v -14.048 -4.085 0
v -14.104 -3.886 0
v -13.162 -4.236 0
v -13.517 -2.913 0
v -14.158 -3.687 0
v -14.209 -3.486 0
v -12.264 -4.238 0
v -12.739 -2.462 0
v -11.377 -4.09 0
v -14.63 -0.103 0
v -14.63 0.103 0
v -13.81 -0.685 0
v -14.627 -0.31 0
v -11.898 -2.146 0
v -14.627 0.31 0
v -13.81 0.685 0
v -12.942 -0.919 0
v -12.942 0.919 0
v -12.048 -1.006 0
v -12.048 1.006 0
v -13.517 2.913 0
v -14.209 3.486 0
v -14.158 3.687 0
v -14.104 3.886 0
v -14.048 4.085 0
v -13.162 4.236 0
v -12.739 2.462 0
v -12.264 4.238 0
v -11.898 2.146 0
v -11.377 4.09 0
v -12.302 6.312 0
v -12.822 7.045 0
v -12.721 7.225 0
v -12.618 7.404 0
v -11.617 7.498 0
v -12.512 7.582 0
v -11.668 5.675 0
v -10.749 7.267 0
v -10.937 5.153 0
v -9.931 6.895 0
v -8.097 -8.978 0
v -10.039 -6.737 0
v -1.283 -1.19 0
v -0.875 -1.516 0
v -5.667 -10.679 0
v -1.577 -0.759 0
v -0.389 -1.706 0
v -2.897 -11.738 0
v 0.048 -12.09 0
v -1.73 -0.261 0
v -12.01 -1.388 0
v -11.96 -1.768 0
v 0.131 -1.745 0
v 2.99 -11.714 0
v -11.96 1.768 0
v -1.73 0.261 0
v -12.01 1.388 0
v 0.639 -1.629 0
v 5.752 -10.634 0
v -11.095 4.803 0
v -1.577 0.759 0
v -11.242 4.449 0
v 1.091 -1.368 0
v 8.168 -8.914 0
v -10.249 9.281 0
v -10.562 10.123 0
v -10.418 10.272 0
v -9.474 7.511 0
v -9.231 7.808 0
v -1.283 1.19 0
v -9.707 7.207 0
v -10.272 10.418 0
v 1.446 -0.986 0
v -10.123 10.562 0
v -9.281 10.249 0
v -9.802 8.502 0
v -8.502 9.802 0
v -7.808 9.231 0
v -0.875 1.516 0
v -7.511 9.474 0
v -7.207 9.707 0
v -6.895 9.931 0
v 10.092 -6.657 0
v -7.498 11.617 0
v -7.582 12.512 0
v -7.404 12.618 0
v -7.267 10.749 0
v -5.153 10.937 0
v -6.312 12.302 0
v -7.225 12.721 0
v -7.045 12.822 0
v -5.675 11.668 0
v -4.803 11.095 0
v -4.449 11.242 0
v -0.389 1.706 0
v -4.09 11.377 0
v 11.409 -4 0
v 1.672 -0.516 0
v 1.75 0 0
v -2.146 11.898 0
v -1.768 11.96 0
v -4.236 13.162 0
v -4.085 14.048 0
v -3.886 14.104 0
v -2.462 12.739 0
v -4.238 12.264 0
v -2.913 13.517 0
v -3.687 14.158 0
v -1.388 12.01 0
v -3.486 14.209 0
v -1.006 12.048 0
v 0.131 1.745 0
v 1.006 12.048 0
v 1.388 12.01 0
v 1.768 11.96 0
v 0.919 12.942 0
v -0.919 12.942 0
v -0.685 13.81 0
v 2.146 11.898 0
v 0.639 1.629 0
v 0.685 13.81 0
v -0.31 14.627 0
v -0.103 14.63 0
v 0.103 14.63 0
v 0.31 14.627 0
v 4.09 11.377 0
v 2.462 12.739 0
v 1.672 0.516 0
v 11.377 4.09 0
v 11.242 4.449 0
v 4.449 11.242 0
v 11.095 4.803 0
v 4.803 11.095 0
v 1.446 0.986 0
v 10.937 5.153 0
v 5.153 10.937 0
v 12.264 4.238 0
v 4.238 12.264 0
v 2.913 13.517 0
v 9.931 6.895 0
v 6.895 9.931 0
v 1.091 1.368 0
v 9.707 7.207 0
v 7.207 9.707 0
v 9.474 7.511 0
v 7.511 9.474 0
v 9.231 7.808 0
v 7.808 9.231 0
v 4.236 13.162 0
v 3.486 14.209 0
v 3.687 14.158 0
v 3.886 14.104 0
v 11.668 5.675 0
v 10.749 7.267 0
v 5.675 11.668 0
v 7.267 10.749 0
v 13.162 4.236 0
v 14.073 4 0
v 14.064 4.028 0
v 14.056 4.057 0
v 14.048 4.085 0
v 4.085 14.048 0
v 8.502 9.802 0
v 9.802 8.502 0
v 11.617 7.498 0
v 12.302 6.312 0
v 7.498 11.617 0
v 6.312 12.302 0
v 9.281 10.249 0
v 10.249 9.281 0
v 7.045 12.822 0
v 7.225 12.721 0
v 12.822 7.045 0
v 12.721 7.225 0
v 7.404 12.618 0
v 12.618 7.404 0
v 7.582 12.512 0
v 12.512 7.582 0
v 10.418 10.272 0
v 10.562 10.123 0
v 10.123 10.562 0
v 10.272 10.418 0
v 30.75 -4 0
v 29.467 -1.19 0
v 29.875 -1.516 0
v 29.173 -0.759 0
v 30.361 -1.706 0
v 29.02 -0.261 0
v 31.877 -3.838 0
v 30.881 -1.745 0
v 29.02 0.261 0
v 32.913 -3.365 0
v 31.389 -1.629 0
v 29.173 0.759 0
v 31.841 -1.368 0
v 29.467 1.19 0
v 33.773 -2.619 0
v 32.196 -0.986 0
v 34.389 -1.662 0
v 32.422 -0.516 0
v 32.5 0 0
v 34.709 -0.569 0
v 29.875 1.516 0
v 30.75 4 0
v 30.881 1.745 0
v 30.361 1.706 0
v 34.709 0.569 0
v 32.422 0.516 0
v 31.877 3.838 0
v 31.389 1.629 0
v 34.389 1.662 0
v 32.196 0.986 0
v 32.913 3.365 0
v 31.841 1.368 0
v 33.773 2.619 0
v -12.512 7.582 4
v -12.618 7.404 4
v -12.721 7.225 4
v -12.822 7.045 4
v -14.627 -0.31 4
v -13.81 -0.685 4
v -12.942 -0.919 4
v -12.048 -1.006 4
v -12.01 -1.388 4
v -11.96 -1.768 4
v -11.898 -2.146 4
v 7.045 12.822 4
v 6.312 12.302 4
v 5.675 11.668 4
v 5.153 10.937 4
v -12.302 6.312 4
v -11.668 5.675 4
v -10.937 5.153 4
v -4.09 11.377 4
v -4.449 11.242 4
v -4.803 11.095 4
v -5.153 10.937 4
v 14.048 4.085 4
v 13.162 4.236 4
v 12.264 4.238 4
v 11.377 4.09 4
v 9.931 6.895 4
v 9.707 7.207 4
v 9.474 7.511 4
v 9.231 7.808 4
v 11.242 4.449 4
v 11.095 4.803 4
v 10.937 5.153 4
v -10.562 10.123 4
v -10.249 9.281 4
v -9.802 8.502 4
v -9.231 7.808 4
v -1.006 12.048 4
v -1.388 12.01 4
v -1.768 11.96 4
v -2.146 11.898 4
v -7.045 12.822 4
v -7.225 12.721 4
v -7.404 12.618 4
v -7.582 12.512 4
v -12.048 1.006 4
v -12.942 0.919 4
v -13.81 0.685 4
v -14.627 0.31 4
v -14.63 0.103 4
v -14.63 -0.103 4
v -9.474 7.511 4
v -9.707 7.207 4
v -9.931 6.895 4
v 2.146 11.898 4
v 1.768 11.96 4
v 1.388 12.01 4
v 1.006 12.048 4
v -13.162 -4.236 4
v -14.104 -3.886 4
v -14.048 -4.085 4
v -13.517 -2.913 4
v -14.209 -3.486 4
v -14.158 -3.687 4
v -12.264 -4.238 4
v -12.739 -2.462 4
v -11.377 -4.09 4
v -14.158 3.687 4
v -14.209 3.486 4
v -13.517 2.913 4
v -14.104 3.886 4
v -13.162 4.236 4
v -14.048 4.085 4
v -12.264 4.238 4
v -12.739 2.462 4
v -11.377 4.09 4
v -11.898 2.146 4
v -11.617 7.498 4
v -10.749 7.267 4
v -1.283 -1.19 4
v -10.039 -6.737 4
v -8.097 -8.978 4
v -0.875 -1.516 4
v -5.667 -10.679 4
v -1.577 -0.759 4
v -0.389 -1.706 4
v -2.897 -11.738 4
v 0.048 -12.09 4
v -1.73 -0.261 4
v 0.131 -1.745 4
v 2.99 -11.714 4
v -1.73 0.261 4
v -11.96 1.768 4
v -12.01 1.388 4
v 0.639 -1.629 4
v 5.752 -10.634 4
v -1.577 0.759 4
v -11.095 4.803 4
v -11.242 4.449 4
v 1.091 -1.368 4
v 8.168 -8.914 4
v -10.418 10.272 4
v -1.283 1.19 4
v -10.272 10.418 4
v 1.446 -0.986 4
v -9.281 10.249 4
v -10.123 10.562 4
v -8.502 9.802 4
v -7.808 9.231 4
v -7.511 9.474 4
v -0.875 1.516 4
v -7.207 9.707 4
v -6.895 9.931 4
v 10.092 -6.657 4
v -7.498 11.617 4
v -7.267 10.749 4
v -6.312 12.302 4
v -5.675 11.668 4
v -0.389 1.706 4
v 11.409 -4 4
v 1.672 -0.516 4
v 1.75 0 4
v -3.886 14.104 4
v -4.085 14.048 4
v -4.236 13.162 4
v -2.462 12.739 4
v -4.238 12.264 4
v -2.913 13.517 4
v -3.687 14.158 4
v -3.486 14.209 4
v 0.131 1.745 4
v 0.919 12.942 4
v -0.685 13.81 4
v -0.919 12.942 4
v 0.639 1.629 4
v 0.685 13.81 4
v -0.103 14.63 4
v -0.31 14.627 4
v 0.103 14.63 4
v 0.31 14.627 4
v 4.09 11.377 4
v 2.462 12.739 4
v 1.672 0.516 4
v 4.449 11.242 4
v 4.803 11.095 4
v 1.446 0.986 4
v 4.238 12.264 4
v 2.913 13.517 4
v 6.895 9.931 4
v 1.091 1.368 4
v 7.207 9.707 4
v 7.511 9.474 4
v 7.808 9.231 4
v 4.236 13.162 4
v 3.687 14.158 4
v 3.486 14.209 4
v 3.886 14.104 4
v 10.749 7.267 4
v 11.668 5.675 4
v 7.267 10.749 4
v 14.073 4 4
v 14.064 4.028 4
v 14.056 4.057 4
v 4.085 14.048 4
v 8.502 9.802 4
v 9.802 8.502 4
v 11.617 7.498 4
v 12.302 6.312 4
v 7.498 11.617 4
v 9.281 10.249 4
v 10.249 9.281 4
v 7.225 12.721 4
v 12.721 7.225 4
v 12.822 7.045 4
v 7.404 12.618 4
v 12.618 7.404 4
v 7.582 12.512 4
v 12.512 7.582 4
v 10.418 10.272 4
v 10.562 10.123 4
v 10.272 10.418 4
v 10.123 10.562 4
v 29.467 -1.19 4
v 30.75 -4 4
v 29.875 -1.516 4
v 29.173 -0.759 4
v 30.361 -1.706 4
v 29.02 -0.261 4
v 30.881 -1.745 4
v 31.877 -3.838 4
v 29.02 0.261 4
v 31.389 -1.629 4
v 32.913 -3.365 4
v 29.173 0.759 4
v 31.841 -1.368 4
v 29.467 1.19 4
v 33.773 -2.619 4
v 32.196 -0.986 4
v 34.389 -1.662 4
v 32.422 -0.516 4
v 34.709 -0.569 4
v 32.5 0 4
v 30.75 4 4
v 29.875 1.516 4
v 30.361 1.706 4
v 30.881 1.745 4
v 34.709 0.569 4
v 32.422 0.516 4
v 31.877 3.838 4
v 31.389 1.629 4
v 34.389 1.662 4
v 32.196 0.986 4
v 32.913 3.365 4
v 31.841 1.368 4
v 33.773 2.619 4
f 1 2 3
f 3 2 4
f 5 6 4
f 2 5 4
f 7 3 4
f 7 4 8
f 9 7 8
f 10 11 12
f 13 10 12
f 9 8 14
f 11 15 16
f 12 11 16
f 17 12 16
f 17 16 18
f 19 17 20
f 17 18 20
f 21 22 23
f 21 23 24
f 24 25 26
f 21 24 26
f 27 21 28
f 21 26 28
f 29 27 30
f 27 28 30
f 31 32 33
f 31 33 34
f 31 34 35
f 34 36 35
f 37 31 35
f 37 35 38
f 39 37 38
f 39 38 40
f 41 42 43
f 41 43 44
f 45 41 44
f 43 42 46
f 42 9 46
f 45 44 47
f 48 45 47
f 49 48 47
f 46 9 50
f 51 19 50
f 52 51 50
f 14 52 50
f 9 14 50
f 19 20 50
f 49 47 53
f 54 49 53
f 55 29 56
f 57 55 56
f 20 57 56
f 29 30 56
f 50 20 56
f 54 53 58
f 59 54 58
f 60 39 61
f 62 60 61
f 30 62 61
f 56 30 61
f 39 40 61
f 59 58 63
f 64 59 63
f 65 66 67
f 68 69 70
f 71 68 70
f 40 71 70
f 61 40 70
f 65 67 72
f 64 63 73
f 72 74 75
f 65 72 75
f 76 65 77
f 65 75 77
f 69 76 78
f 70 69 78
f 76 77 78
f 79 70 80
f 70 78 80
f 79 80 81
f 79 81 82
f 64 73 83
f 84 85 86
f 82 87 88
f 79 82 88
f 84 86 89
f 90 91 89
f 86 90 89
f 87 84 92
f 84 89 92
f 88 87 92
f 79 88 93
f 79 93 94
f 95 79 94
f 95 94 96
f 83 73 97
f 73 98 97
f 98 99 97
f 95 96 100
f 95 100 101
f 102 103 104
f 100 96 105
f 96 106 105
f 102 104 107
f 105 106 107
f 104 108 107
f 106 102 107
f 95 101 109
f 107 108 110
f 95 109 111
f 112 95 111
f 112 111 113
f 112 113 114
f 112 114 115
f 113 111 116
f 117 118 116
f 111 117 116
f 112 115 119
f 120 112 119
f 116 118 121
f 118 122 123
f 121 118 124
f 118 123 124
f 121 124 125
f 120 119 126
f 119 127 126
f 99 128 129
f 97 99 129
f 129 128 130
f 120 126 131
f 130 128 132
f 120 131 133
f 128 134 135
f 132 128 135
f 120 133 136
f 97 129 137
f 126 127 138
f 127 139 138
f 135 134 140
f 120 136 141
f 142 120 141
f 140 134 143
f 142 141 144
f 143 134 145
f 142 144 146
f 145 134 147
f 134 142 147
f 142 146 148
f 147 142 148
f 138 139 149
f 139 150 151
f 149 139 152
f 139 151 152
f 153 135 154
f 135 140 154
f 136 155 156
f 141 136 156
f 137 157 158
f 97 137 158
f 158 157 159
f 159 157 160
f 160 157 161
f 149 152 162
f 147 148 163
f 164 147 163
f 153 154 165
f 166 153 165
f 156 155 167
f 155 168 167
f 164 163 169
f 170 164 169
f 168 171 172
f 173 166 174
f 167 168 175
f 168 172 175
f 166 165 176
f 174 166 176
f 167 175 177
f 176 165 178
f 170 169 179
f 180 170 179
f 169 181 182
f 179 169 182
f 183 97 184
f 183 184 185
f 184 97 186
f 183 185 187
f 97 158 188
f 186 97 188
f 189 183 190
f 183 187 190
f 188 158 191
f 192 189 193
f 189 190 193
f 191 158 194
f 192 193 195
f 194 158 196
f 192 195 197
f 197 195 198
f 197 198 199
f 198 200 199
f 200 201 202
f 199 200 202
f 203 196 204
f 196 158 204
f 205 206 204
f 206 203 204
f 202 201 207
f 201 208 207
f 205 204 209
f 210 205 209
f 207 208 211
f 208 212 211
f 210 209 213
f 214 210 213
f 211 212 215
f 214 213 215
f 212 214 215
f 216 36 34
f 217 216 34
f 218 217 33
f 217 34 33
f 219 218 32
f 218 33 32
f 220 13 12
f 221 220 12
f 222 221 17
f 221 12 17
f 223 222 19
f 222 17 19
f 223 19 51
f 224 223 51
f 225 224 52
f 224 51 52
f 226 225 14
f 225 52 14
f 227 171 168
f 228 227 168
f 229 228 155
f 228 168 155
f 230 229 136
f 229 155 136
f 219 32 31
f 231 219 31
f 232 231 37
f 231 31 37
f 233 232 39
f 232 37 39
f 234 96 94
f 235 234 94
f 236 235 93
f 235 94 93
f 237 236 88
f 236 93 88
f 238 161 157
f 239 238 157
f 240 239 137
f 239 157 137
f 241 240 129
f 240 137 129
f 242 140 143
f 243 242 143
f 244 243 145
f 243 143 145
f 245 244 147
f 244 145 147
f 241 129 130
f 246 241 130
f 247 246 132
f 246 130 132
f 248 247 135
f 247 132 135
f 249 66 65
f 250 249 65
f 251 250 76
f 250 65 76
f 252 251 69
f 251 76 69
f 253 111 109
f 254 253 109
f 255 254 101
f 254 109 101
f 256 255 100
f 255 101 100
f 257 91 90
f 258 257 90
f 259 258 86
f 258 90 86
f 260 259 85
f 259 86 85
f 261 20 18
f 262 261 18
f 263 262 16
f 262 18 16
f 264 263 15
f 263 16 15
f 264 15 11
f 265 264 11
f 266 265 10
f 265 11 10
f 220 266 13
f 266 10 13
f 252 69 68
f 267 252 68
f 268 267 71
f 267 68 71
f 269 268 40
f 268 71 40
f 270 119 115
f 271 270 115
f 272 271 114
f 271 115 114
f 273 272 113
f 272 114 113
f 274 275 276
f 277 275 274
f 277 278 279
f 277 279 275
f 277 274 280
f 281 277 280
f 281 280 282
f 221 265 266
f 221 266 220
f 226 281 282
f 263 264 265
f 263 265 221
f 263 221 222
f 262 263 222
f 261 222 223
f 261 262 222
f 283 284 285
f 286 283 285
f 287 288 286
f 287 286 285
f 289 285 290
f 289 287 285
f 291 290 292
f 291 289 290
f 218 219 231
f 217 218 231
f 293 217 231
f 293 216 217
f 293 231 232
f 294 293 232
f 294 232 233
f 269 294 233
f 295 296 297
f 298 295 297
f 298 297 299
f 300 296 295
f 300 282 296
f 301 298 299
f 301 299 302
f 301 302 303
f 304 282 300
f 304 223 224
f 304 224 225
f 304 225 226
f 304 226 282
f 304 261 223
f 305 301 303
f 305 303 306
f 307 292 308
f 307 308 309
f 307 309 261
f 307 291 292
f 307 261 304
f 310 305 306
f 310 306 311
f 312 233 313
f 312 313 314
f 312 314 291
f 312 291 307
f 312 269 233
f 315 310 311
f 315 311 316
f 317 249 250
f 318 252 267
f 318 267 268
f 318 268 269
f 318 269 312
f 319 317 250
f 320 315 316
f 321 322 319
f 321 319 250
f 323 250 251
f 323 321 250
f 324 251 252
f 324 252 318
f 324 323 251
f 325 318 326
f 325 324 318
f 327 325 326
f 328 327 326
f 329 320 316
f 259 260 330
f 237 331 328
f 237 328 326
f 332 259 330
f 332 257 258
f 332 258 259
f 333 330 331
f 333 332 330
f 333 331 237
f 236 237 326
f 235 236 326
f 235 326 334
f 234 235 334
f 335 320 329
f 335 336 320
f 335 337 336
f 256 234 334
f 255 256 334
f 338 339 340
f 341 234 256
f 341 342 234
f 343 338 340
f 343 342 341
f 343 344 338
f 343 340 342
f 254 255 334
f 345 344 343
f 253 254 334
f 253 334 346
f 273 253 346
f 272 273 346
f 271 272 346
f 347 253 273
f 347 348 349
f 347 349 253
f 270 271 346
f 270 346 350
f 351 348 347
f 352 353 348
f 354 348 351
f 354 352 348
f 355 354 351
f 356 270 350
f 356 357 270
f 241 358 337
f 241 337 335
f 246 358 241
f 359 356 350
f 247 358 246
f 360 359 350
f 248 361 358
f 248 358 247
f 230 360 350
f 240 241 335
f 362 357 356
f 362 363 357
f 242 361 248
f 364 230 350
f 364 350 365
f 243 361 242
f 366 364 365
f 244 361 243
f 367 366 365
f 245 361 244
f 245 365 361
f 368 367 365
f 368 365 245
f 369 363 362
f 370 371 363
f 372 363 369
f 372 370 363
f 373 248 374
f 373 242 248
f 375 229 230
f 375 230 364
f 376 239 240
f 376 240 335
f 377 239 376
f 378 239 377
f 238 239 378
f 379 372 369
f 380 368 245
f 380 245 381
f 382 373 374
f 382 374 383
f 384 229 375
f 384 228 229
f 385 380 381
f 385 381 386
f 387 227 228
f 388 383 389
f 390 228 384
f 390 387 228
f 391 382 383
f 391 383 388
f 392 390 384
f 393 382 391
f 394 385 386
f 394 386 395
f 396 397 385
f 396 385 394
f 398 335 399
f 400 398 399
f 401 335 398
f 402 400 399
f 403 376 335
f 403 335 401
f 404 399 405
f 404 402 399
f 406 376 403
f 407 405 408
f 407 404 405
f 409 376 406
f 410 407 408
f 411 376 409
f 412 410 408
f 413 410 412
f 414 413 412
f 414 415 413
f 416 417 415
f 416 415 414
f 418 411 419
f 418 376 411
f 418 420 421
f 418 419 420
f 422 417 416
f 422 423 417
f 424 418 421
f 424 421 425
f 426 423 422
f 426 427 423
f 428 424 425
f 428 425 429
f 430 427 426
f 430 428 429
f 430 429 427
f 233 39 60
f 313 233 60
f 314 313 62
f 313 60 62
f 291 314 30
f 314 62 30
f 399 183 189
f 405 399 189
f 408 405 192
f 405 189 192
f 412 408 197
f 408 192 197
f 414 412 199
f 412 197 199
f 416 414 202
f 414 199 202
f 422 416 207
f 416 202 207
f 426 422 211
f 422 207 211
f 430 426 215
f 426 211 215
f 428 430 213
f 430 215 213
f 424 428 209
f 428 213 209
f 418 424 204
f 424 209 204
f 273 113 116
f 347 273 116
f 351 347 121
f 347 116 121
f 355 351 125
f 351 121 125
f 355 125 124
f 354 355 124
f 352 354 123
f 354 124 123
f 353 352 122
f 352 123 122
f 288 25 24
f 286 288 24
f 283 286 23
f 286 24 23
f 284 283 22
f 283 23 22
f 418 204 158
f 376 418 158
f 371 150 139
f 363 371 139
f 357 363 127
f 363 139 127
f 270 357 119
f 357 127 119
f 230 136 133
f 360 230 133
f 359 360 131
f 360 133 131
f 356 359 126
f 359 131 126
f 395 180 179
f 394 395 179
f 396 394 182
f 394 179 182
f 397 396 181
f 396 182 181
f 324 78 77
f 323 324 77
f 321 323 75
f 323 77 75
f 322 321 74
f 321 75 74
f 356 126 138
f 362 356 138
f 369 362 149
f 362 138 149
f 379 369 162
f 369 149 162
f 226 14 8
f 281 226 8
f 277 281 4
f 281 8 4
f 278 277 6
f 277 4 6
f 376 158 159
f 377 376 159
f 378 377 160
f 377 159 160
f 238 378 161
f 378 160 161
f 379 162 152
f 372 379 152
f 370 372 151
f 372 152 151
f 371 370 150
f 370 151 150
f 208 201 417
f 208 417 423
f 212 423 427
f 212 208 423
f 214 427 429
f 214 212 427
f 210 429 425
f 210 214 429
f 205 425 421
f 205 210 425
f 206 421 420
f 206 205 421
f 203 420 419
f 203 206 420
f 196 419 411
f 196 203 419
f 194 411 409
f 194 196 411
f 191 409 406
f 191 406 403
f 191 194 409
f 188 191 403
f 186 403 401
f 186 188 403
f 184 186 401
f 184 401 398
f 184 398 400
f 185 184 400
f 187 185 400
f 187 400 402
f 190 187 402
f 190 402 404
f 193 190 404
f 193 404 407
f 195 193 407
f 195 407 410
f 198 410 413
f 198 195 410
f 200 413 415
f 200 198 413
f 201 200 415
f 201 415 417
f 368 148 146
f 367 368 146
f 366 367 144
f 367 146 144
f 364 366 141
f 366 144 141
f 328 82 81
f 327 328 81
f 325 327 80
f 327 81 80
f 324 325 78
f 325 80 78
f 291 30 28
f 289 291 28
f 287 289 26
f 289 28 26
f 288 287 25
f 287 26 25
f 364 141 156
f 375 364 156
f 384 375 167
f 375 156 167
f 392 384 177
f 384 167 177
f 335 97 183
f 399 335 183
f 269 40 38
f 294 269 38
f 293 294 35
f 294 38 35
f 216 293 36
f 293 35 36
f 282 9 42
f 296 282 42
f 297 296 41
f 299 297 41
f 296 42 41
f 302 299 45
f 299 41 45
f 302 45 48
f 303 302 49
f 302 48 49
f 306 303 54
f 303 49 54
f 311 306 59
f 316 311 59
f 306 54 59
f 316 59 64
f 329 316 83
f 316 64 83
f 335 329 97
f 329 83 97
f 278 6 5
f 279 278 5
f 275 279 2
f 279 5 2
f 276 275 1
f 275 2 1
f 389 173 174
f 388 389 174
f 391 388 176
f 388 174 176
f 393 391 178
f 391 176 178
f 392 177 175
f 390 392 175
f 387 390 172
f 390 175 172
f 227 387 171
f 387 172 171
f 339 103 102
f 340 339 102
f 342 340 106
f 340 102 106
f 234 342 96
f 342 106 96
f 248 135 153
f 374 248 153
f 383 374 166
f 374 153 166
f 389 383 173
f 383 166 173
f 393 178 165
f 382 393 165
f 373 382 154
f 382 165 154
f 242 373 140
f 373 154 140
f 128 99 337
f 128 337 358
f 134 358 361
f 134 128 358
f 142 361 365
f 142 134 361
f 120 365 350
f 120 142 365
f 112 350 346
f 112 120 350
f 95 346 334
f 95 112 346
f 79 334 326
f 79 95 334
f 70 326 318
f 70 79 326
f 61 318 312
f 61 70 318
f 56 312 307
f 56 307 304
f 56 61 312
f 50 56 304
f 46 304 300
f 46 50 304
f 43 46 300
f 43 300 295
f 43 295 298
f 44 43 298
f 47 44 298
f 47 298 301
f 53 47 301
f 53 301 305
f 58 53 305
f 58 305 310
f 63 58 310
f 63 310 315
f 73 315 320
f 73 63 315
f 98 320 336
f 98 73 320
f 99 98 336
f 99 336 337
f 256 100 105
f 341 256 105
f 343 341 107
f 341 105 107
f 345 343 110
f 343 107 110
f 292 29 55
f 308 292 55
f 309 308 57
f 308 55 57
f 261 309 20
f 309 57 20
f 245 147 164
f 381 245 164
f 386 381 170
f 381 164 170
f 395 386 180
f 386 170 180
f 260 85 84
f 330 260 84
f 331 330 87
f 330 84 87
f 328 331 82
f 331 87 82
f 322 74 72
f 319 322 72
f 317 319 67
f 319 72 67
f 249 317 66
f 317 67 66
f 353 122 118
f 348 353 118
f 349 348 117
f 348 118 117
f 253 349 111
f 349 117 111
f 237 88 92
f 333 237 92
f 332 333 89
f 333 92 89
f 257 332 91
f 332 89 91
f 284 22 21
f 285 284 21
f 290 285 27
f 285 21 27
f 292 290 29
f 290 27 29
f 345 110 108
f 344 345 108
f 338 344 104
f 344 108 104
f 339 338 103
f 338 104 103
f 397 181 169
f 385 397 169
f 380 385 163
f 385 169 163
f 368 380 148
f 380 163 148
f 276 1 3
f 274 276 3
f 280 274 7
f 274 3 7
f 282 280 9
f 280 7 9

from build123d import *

# Parameters (mm, degrees)
SKETCH1_R           = 1.75
BOSS_EXTRUDE1_DEPTH = 4


with BuildPart() as part:
    # Sketch1 → Boss-Extrude1 (new body)
    with BuildSketch(Plane.XY):
        with BuildLine():
            ThreePointArc((30.75, -4), (34.75, 0), (30.75, 4))
            Line((30.75, 4), (14.072558403, 4))
            ThreePointArc((14.072558403, 4), (14.06038767, 4.04257326), (14.048088143, 4.085109489))
            ThreePointArc((14.048088143, 4.085109489), (12.712915648, 4.255390909), (11.377106712, 4.090176385))
            ThreePointArc((11.377106712, 4.090176385), (11.169703548, 4.626642697), (10.937020765, 5.152637848))
            ThreePointArc((10.937020765, 5.152637848), (11.998404632, 5.980373095), (12.82210701, 7.044889767))
            ThreePointArc((12.82210701, 7.044889767), (12.669951657, 7.315), (12.51210701, 7.581825517))
            ThreePointArc((12.51210701, 7.581825517), (11.17835734, 7.400736668), (9.930825655, 6.8954189))
            ThreePointArc((9.930825655, 6.8954189), (9.591641884, 7.359925677), (9.230750012, 7.807775241))
            ThreePointArc((9.230750012, 7.807775241), (10.041734454, 8.882012453), (10.561852666, 10.123446462))
            ThreePointArc((10.561852666, 10.123446462), (10.344972209, 10.344972209), (10.123446462, 10.561852666))
            ThreePointArc((10.123446462, 10.561852666), (8.882012453, 10.041734454), (7.807775241, 9.230750012))
            ThreePointArc((7.807775241, 9.230750012), (7.359925677, 9.591641884), (6.8954189, 9.930825655))
            ThreePointArc((6.8954189, 9.930825655), (7.400736668, 11.17835734), (7.581825517, 12.51210701))
            ThreePointArc((7.581825517, 12.51210701), (7.315, 12.669951657), (7.044889767, 12.82210701))
            ThreePointArc((7.044889767, 12.82210701), (5.980373095, 11.998404632), (5.152637848, 10.937020765))
            ThreePointArc((5.152637848, 10.937020765), (4.626642697, 11.169703548), (4.090176385, 11.377106712))
            ThreePointArc((4.090176385, 11.377106712), (4.255390909, 12.712915648), (4.085109489, 14.048088143))
            ThreePointArc((4.085109489, 14.048088143), (3.78652263, 14.131494839), (3.486235477, 14.208555951))
            ThreePointArc((3.486235477, 14.208555951), (2.671181194, 13.137403362), (2.1463567, 11.897951627))
            ThreePointArc((2.1463567, 11.897951627), (1.578061664, 11.986568374), (1.00619511, 12.048056748))
            ThreePointArc((1.00619511, 12.048056748), (0.820047291, 13.381109763), (0.31, 14.626715284))
            ThreePointArc((0.31, 14.626715284), (0, 14.63), (-0.31, 14.626715284))
            ThreePointArc((-0.31, 14.626715284), (-0.820047291, 13.381109763), (-1.00619511, 12.048056748))
            ThreePointArc((-1.00619511, 12.048056748), (-1.578061664, 11.986568374), (-2.1463567, 11.897951627))
            ThreePointArc((-2.1463567, 11.897951627), (-2.671181194, 13.137403362), (-3.486235477, 14.208555951))
            ThreePointArc((-3.486235477, 14.208555951), (-3.78652263, 14.131494839), (-4.085109489, 14.048088143))
            ThreePointArc((-4.085109489, 14.048088143), (-4.255390909, 12.712915648), (-4.090176385, 11.377106712))
            ThreePointArc((-4.090176385, 11.377106712), (-4.626642697, 11.169703548), (-5.152637848, 10.937020765))
            ThreePointArc((-5.152637848, 10.937020765), (-5.980373095, 11.998404632), (-7.044889767, 12.82210701))
            ThreePointArc((-7.044889767, 12.82210701), (-7.315, 12.669951657), (-7.581825517, 12.51210701))
            ThreePointArc((-7.581825517, 12.51210701), (-7.400736668, 11.17835734), (-6.8954189, 9.930825655))
            ThreePointArc((-6.8954189, 9.930825655), (-7.359925677, 9.591641884), (-7.807775241, 9.230750012))
            ThreePointArc((-7.807775241, 9.230750012), (-8.882012453, 10.041734454), (-10.123446462, 10.561852666))
            ThreePointArc((-10.123446462, 10.561852666), (-10.344972209, 10.344972209), (-10.561852666, 10.123446462))
            ThreePointArc((-10.561852666, 10.123446462), (-10.041734454, 8.882012453), (-9.230750012, 7.807775241))
            ThreePointArc((-9.230750012, 7.807775241), (-9.591641884, 7.359925677), (-9.930825655, 6.8954189))
            ThreePointArc((-9.930825655, 6.8954189), (-11.17835734, 7.400736668), (-12.51210701, 7.581825517))
            ThreePointArc((-12.51210701, 7.581825517), (-12.669951657, 7.315), (-12.82210701, 7.044889767))
            ThreePointArc((-12.82210701, 7.044889767), (-11.998404632, 5.980373095), (-10.937020765, 5.152637848))
            ThreePointArc((-10.937020765, 5.152637848), (-11.169703548, 4.626642697), (-11.377106712, 4.090176385))
            ThreePointArc((-11.377106712, 4.090176385), (-12.712915648, 4.255390909), (-14.048088143, 4.085109489))
            ThreePointArc((-14.048088143, 4.085109489), (-14.131494839, 3.78652263), (-14.208555951, 3.486235477))
            ThreePointArc((-14.208555951, 3.486235477), (-13.137403362, 2.671181194), (-11.897951627, 2.1463567))
            ThreePointArc((-11.897951627, 2.1463567), (-11.986568374, 1.578061664), (-12.048056748, 1.00619511))
            ThreePointArc((-12.048056748, 1.00619511), (-13.381109763, 0.820047291), (-14.626715284, 0.31))
            ThreePointArc((-14.626715284, 0.31), (-14.63, 0), (-14.626715284, -0.31))
            ThreePointArc((-14.626715284, -0.31), (-13.381109763, -0.820047291), (-12.048056748, -1.00619511))
            ThreePointArc((-12.048056748, -1.00619511), (-11.986568374, -1.578061664), (-11.897951627, -2.1463567))
            ThreePointArc((-11.897951627, -2.1463567), (-13.137403362, -2.671181194), (-14.208555951, -3.486235477))
            ThreePointArc((-14.208555951, -3.486235477), (-14.131494839, -3.78652263), (-14.048088143, -4.085109489))
            ThreePointArc((-14.048088143, -4.085109489), (-12.712915648, -4.255390909), (-11.377106712, -4.090176385))
            ThreePointArc((-11.377106712, -4.090176385), (0.047845736, -12.089905326), (11.409123542, -4))
            Line((11.409123542, -4), (30.75, -4))
        make_face()
        Circle(SKETCH1_R, mode=Mode.SUBTRACT)
        with Locations((30.75, 0)):
            Circle(SKETCH1_R, mode=Mode.SUBTRACT)
    extrude(amount=BOSS_EXTRUDE1_DEPTH)


solid = part.part
